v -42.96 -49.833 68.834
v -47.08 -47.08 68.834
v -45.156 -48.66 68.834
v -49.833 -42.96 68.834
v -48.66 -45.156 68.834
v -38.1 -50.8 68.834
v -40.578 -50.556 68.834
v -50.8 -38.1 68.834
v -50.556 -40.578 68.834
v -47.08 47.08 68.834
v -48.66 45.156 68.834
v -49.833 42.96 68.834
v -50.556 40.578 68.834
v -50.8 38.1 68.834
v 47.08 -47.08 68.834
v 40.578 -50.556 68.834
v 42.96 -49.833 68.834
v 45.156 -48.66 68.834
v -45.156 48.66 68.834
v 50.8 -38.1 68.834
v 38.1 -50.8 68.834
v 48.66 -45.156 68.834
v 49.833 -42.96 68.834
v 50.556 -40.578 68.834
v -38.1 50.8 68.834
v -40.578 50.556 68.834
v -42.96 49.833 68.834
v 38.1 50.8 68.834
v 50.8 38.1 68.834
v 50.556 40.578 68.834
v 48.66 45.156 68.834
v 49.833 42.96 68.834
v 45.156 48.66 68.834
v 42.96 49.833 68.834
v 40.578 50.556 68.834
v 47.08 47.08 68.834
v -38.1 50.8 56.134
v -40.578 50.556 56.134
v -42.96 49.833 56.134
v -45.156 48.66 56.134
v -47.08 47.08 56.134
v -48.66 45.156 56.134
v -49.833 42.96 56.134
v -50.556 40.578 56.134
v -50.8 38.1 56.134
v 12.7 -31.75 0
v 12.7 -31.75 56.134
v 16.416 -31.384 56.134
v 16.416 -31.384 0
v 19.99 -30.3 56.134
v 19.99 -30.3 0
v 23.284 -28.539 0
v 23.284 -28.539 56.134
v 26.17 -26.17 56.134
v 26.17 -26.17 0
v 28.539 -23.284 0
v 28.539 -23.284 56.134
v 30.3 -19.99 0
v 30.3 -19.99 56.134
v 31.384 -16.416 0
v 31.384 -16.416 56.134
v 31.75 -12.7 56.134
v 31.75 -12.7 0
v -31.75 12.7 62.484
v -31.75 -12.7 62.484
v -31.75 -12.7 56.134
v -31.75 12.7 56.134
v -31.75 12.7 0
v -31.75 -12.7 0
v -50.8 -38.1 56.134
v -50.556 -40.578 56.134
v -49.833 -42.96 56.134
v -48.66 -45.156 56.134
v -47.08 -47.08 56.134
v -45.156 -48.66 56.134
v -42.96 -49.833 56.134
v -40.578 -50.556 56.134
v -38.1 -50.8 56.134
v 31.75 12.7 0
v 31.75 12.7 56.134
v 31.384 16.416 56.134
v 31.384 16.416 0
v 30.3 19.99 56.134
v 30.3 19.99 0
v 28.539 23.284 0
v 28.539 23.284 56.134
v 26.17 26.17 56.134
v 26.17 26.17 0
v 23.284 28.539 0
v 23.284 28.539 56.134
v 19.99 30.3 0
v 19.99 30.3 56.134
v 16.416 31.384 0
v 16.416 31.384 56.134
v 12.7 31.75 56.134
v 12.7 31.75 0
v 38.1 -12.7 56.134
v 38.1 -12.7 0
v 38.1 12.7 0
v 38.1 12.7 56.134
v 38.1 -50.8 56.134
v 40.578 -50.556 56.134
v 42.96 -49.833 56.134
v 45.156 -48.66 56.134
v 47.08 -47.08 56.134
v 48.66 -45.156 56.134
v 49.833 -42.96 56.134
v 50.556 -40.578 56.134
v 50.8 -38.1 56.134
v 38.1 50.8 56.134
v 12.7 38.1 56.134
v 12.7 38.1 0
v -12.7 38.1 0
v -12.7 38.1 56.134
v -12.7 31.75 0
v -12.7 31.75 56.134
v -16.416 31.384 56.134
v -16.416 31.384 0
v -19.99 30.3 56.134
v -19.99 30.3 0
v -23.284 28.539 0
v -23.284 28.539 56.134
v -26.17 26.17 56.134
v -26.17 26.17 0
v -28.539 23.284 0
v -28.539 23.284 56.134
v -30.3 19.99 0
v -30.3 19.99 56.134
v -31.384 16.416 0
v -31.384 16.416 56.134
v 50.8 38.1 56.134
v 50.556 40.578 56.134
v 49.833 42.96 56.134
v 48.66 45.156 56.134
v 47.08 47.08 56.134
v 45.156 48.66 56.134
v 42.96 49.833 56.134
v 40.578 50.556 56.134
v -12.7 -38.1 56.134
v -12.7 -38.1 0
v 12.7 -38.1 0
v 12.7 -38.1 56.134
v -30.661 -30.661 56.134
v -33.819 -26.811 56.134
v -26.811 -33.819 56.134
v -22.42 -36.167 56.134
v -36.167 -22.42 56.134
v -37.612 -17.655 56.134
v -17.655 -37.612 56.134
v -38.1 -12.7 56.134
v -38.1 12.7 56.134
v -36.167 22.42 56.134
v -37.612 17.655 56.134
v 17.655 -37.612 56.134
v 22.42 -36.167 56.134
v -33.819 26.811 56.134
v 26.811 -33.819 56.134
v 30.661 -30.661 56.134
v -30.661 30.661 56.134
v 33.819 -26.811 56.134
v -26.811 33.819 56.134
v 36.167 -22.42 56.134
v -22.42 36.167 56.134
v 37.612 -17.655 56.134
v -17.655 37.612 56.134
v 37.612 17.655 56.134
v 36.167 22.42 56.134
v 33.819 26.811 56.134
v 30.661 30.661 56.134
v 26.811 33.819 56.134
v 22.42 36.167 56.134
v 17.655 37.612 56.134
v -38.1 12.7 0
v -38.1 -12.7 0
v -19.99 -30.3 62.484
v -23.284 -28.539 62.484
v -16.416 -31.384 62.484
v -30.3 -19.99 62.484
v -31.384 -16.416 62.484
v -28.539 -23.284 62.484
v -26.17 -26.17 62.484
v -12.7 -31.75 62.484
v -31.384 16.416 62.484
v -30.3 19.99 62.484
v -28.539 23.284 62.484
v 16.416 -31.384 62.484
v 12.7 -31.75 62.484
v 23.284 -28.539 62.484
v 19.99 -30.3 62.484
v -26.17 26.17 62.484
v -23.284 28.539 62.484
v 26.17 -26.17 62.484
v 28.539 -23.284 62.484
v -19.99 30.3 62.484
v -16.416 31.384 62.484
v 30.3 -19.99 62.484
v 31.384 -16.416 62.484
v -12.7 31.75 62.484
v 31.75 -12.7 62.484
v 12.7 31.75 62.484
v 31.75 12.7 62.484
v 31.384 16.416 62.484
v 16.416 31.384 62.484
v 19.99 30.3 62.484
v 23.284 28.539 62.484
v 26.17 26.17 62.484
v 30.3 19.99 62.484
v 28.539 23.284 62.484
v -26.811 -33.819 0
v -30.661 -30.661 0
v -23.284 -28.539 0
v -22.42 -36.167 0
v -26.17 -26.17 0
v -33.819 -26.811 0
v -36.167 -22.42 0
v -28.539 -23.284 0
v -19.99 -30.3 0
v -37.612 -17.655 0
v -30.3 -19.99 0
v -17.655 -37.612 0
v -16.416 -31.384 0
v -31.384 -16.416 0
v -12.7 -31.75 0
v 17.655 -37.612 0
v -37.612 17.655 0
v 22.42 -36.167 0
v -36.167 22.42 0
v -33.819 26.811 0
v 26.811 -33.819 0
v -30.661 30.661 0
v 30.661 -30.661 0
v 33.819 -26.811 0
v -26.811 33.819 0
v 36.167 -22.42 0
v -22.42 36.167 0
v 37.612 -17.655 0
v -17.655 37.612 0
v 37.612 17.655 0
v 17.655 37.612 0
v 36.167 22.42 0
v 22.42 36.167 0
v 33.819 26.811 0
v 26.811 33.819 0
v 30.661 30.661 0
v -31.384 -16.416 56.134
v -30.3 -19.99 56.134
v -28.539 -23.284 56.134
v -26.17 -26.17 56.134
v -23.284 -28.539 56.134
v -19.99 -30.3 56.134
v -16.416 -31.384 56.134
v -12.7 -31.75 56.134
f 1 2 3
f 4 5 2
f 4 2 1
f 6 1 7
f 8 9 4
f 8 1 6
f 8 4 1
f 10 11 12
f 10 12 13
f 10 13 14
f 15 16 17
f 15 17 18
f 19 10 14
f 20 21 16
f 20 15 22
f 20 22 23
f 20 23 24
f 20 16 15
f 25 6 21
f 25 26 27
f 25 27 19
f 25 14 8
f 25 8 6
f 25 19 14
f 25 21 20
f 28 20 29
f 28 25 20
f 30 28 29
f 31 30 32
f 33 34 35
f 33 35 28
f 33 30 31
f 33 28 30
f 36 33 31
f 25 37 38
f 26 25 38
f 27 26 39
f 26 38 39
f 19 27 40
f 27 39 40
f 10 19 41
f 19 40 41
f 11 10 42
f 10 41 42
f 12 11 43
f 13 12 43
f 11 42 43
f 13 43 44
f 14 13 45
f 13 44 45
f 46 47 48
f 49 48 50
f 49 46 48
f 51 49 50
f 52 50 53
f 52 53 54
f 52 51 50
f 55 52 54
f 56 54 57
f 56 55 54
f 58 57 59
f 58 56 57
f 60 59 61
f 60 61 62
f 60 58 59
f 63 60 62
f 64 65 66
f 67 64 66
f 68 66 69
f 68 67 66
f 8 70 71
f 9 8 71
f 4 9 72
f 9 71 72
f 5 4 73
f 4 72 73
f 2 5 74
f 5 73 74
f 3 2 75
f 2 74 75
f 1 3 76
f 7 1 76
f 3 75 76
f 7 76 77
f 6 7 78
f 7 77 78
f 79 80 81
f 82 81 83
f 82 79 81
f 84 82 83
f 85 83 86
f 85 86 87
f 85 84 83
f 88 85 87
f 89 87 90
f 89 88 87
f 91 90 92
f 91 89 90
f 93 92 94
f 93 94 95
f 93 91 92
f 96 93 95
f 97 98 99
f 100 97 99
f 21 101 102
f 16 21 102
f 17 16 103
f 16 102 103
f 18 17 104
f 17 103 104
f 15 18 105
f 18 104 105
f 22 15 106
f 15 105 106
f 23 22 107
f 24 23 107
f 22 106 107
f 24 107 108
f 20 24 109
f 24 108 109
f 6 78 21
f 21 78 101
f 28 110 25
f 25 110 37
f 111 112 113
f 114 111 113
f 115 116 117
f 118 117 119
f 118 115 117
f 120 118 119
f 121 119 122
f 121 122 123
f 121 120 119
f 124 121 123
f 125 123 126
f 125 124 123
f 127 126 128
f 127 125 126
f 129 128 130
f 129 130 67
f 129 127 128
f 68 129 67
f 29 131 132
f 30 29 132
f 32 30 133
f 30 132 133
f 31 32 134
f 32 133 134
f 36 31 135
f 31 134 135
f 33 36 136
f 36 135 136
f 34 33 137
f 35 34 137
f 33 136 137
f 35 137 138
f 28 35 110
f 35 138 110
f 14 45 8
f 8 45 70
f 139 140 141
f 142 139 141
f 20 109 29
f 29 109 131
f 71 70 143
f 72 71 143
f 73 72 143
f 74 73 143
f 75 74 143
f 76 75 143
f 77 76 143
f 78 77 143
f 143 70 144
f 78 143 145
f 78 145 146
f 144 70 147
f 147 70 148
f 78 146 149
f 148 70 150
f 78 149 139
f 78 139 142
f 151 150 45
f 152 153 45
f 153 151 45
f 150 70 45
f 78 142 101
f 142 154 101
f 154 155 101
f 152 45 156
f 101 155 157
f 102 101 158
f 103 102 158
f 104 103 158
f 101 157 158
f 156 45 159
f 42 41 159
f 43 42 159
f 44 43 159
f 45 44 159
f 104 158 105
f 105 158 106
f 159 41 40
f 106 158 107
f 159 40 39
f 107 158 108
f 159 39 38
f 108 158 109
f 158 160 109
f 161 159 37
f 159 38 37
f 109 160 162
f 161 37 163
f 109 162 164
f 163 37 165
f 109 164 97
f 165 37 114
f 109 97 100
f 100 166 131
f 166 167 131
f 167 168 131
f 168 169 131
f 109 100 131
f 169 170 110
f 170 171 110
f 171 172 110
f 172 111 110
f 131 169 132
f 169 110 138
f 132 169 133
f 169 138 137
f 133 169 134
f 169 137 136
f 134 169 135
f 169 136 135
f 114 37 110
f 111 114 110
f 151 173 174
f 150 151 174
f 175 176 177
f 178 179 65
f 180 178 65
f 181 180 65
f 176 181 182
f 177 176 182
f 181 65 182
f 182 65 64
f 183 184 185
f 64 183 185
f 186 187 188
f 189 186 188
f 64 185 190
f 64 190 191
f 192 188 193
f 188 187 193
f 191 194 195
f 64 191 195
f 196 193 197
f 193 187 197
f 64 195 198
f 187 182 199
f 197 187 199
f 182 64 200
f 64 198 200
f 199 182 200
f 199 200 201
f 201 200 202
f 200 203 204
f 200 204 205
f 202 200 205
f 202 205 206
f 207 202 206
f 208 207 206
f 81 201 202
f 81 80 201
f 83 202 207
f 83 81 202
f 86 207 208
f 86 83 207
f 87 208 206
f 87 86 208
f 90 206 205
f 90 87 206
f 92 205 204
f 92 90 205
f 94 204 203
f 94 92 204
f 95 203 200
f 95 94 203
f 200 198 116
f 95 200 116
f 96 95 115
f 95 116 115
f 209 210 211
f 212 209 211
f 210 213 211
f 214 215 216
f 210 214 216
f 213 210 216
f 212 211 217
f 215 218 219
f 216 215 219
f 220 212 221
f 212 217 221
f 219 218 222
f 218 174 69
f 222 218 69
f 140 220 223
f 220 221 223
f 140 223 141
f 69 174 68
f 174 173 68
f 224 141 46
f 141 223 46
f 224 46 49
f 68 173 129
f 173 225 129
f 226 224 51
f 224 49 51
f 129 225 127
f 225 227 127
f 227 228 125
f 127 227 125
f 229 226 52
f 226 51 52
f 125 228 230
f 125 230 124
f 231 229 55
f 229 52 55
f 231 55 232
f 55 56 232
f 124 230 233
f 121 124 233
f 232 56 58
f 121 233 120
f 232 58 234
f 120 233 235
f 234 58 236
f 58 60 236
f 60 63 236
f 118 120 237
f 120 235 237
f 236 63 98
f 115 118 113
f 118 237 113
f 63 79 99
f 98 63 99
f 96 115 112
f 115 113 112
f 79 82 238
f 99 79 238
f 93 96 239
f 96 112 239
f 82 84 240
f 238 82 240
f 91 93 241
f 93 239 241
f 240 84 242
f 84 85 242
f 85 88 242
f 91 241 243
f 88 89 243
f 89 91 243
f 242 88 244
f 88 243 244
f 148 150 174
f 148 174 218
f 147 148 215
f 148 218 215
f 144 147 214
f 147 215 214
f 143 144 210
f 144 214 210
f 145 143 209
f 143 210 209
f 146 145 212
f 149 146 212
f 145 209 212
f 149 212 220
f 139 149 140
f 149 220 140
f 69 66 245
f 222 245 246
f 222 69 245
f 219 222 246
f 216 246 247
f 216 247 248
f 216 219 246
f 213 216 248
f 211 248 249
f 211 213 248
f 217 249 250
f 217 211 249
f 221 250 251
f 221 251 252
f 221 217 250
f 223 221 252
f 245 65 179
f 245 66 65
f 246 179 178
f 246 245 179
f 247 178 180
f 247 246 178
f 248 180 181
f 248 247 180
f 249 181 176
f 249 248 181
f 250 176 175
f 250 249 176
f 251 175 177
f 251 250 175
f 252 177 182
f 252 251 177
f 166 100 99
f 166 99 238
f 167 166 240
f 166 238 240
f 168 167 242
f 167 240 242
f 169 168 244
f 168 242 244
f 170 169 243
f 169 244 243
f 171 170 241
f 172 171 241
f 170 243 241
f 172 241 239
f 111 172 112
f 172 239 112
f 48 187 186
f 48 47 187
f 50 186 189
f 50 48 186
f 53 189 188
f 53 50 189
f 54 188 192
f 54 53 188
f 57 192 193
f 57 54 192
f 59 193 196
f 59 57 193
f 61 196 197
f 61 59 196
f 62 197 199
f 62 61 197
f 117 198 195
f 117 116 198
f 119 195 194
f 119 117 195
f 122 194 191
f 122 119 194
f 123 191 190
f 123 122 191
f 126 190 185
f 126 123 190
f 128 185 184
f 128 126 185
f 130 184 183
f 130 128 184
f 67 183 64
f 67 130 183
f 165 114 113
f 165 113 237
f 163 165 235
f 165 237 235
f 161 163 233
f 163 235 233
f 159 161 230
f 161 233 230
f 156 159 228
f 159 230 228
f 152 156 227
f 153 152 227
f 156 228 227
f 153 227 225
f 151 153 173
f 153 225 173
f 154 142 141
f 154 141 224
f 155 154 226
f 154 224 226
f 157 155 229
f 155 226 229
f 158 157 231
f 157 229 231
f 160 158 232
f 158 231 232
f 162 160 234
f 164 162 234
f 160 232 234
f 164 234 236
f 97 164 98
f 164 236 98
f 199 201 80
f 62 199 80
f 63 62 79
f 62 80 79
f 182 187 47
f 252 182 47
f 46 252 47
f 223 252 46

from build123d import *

# Parameters (mm, degrees)
F1_DEPTH     = 56.134
F3_DEPTH     = 12.7
F4_T         = 6.35
F4_T3_DEPTH  = 38.1
F4_T5_DEPTH  = 38.1
F4_T8_ANGLE  = 90.000000001
F4_T10_ANGLE = 90.000000001
F4_T12_ANGLE = 90.000000001
F4_T14_ANGLE = 90.000000001


# Not quite as in the source:
# - a shell that OpenCascade refuses in one call is made with other operations: the cavity is built on its own and cut out


with BuildPart() as f1:
    # F0 (on Top) → F1 (new body)
    with BuildSketch(Plane.XY):
        with BuildLine():
            ThreePointArc((-38.1, -12.7), (-30.6605122421, -30.6605122421), (-12.7, -38.1))
            Line((-12.7, -38.1), (12.7, -38.1))
            ThreePointArc((12.7, -38.1), (30.6605122421, -30.6605122421), (38.1, -12.7))
            Line((38.1, -12.7), (38.1, 12.7))
            ThreePointArc((38.1, 12.7), (30.6605122421, 30.6605122421), (12.7, 38.1))
            Line((12.7, 38.1), (-12.7, 38.1))
            ThreePointArc((-12.7, 38.1), (-30.6605122421, 30.6605122421), (-38.1, 12.7))
            Line((-38.1, 12.7), (-38.1, -12.7))
        make_face()
    extrude(amount=F1_DEPTH)

    # F2 (on face) → F3 (join)
    with BuildSketch(Plane.XY.offset(56.134)):
        with BuildLine():
            ThreePointArc((-50.8, -38.1), (-47.0802561211, -47.0802561211), (-38.1, -50.8))
            Line((-38.1, -50.8), (38.1, -50.8))
            ThreePointArc((38.1, -50.8), (47.0802561211, -47.0802561211), (50.8, -38.1))
            Line((50.8, -38.1), (50.8, 38.1))
            ThreePointArc((50.8, 38.1), (47.0802561211, 47.0802561211), (38.1, 50.8))
            Line((38.1, 50.8), (-38.1, 50.8))
            ThreePointArc((-38.1, 50.8), (-47.0802561211, 47.0802561211), (-50.8, 38.1))
            Line((-50.8, 38.1), (-50.8, -38.1))
        make_face()
    extrude(amount=F3_DEPTH)

    # F4: shell of thickness 6.35, made by hand


with BuildPart() as f4_core1:
    # F4_t2: copy of F1
    add(f1.part)

    # the walls: a layer under each face that stays
    f4_faces = [f4_core1.faces().sort_by_distance(p)[0] for p in [
        (-47.0802561211, -47.0802561211, 62.484),
        (-50.8, 0, 62.484),
        (0, -50.8, 62.484),
        (-33.8666666667, -33.8666666667, 56.134),
        (0, 0, 68.834),
        (-47.0802561211, 47.0802561211, 62.484),
        (47.0802561211, -47.0802561211, 62.484),
        (0, 50.8, 62.484),
        (50.8, 0, 62.484),
        (47.0802561211, 47.0802561211, 62.484),
        (-38.1, 0, 28.067),
        (-30.6605122421, -30.6605122421, 28.067),
        (0, -38.1, 28.067),
        (30.6605122421, -30.6605122421, 28.067),
        (38.1, 0, 28.067),
        (30.6605122421, 30.6605122421, 28.067),
        (0, 38.1, 28.067),
        (-30.6605122421, 30.6605122421, 28.067),
    ]]
    thicken(f4_faces, amount=-F4_T, mode=Mode.SUBTRACT)

    # F4_s4 → F4_t3 (cut)
    with BuildSketch(Plane.XZ.offset(-19.05)):
        Polygon((-38.1635, 56.0705), (-38.1, 62.484), (-31.75, 62.484), (-31.75, 56.134), align=None)
        Polygon((38.1635, 56.0705), (38.1, 62.484), (31.75, 62.484), (31.75, 56.134), align=None)
    extrude(amount=F4_T3_DEPTH, mode=Mode.SUBTRACT)

    # F4_s6 → F4_t5 (cut)
    with BuildSketch(Plane.YZ.offset(-19.05)):
        Polygon((-38.1635, 56.0705), (-38.1, 62.484), (-31.75, 62.484), (-31.75, 56.134), align=None)
        Polygon((38.1635, 56.0705), (38.1, 62.484), (31.75, 62.484), (31.75, 56.134), align=None)
    extrude(amount=F4_T5_DEPTH, mode=Mode.SUBTRACT)

    # F4_s7 → F4_t8 (revolve, cut)
    with BuildSketch(Plane.XZ.offset(12.7)):
        Polygon((-38.1635, 56.0705), (-38.1, 62.484), (-31.75, 62.484), (-31.75, 56.134), align=None)
    revolve(axis=Axis((-12.7, -12.7, 56.134), (0, 0, 1)), revolution_arc=F4_T8_ANGLE, mode=Mode.SUBTRACT)

    # F4_s9 → F4_t10 (revolve, cut)
    with BuildSketch(Plane.YZ.offset(12.7)):
        Polygon((-38.1635, 56.0705), (-38.1, 62.484), (-31.75, 62.484), (-31.75, 56.134), align=None)
    revolve(axis=Axis((12.7, -12.7, 56.134), (0, 0, 1)), revolution_arc=F4_T10_ANGLE, mode=Mode.SUBTRACT)

    # F4_s11 → F4_t12 (revolve, cut)
    with BuildSketch(Plane.XZ.offset(-12.7)):
        Polygon((38.1635, 56.0705), (38.1, 62.484), (31.75, 62.484), (31.75, 56.134), align=None)
    revolve(axis=Axis((12.7, 12.7, 56.134), (0, 0, 1)), revolution_arc=F4_T12_ANGLE, mode=Mode.SUBTRACT)

    # F4_s13 → F4_t14 (revolve, cut)
    with BuildSketch(Plane.YZ.offset(-12.7)):
        Polygon((38.1635, 56.0705), (38.1, 62.484), (31.75, 62.484), (31.75, 56.134), align=None)
    revolve(axis=Axis((-12.7, 12.7, 56.134), (0, 0, 1)), revolution_arc=F4_T14_ANGLE, mode=Mode.SUBTRACT)


with BuildPart() as f1_1:
    add(f1.part)

    # what is left inside the walls is the cavity
    f4_cavity = [f4_core1.part.solids().sort_by_distance(p)[0] for p in [
        (0, -10.583333, 62.4205),
    ]]
    add(f4_cavity, mode=Mode.SUBTRACT)


solid = f1_1.part
